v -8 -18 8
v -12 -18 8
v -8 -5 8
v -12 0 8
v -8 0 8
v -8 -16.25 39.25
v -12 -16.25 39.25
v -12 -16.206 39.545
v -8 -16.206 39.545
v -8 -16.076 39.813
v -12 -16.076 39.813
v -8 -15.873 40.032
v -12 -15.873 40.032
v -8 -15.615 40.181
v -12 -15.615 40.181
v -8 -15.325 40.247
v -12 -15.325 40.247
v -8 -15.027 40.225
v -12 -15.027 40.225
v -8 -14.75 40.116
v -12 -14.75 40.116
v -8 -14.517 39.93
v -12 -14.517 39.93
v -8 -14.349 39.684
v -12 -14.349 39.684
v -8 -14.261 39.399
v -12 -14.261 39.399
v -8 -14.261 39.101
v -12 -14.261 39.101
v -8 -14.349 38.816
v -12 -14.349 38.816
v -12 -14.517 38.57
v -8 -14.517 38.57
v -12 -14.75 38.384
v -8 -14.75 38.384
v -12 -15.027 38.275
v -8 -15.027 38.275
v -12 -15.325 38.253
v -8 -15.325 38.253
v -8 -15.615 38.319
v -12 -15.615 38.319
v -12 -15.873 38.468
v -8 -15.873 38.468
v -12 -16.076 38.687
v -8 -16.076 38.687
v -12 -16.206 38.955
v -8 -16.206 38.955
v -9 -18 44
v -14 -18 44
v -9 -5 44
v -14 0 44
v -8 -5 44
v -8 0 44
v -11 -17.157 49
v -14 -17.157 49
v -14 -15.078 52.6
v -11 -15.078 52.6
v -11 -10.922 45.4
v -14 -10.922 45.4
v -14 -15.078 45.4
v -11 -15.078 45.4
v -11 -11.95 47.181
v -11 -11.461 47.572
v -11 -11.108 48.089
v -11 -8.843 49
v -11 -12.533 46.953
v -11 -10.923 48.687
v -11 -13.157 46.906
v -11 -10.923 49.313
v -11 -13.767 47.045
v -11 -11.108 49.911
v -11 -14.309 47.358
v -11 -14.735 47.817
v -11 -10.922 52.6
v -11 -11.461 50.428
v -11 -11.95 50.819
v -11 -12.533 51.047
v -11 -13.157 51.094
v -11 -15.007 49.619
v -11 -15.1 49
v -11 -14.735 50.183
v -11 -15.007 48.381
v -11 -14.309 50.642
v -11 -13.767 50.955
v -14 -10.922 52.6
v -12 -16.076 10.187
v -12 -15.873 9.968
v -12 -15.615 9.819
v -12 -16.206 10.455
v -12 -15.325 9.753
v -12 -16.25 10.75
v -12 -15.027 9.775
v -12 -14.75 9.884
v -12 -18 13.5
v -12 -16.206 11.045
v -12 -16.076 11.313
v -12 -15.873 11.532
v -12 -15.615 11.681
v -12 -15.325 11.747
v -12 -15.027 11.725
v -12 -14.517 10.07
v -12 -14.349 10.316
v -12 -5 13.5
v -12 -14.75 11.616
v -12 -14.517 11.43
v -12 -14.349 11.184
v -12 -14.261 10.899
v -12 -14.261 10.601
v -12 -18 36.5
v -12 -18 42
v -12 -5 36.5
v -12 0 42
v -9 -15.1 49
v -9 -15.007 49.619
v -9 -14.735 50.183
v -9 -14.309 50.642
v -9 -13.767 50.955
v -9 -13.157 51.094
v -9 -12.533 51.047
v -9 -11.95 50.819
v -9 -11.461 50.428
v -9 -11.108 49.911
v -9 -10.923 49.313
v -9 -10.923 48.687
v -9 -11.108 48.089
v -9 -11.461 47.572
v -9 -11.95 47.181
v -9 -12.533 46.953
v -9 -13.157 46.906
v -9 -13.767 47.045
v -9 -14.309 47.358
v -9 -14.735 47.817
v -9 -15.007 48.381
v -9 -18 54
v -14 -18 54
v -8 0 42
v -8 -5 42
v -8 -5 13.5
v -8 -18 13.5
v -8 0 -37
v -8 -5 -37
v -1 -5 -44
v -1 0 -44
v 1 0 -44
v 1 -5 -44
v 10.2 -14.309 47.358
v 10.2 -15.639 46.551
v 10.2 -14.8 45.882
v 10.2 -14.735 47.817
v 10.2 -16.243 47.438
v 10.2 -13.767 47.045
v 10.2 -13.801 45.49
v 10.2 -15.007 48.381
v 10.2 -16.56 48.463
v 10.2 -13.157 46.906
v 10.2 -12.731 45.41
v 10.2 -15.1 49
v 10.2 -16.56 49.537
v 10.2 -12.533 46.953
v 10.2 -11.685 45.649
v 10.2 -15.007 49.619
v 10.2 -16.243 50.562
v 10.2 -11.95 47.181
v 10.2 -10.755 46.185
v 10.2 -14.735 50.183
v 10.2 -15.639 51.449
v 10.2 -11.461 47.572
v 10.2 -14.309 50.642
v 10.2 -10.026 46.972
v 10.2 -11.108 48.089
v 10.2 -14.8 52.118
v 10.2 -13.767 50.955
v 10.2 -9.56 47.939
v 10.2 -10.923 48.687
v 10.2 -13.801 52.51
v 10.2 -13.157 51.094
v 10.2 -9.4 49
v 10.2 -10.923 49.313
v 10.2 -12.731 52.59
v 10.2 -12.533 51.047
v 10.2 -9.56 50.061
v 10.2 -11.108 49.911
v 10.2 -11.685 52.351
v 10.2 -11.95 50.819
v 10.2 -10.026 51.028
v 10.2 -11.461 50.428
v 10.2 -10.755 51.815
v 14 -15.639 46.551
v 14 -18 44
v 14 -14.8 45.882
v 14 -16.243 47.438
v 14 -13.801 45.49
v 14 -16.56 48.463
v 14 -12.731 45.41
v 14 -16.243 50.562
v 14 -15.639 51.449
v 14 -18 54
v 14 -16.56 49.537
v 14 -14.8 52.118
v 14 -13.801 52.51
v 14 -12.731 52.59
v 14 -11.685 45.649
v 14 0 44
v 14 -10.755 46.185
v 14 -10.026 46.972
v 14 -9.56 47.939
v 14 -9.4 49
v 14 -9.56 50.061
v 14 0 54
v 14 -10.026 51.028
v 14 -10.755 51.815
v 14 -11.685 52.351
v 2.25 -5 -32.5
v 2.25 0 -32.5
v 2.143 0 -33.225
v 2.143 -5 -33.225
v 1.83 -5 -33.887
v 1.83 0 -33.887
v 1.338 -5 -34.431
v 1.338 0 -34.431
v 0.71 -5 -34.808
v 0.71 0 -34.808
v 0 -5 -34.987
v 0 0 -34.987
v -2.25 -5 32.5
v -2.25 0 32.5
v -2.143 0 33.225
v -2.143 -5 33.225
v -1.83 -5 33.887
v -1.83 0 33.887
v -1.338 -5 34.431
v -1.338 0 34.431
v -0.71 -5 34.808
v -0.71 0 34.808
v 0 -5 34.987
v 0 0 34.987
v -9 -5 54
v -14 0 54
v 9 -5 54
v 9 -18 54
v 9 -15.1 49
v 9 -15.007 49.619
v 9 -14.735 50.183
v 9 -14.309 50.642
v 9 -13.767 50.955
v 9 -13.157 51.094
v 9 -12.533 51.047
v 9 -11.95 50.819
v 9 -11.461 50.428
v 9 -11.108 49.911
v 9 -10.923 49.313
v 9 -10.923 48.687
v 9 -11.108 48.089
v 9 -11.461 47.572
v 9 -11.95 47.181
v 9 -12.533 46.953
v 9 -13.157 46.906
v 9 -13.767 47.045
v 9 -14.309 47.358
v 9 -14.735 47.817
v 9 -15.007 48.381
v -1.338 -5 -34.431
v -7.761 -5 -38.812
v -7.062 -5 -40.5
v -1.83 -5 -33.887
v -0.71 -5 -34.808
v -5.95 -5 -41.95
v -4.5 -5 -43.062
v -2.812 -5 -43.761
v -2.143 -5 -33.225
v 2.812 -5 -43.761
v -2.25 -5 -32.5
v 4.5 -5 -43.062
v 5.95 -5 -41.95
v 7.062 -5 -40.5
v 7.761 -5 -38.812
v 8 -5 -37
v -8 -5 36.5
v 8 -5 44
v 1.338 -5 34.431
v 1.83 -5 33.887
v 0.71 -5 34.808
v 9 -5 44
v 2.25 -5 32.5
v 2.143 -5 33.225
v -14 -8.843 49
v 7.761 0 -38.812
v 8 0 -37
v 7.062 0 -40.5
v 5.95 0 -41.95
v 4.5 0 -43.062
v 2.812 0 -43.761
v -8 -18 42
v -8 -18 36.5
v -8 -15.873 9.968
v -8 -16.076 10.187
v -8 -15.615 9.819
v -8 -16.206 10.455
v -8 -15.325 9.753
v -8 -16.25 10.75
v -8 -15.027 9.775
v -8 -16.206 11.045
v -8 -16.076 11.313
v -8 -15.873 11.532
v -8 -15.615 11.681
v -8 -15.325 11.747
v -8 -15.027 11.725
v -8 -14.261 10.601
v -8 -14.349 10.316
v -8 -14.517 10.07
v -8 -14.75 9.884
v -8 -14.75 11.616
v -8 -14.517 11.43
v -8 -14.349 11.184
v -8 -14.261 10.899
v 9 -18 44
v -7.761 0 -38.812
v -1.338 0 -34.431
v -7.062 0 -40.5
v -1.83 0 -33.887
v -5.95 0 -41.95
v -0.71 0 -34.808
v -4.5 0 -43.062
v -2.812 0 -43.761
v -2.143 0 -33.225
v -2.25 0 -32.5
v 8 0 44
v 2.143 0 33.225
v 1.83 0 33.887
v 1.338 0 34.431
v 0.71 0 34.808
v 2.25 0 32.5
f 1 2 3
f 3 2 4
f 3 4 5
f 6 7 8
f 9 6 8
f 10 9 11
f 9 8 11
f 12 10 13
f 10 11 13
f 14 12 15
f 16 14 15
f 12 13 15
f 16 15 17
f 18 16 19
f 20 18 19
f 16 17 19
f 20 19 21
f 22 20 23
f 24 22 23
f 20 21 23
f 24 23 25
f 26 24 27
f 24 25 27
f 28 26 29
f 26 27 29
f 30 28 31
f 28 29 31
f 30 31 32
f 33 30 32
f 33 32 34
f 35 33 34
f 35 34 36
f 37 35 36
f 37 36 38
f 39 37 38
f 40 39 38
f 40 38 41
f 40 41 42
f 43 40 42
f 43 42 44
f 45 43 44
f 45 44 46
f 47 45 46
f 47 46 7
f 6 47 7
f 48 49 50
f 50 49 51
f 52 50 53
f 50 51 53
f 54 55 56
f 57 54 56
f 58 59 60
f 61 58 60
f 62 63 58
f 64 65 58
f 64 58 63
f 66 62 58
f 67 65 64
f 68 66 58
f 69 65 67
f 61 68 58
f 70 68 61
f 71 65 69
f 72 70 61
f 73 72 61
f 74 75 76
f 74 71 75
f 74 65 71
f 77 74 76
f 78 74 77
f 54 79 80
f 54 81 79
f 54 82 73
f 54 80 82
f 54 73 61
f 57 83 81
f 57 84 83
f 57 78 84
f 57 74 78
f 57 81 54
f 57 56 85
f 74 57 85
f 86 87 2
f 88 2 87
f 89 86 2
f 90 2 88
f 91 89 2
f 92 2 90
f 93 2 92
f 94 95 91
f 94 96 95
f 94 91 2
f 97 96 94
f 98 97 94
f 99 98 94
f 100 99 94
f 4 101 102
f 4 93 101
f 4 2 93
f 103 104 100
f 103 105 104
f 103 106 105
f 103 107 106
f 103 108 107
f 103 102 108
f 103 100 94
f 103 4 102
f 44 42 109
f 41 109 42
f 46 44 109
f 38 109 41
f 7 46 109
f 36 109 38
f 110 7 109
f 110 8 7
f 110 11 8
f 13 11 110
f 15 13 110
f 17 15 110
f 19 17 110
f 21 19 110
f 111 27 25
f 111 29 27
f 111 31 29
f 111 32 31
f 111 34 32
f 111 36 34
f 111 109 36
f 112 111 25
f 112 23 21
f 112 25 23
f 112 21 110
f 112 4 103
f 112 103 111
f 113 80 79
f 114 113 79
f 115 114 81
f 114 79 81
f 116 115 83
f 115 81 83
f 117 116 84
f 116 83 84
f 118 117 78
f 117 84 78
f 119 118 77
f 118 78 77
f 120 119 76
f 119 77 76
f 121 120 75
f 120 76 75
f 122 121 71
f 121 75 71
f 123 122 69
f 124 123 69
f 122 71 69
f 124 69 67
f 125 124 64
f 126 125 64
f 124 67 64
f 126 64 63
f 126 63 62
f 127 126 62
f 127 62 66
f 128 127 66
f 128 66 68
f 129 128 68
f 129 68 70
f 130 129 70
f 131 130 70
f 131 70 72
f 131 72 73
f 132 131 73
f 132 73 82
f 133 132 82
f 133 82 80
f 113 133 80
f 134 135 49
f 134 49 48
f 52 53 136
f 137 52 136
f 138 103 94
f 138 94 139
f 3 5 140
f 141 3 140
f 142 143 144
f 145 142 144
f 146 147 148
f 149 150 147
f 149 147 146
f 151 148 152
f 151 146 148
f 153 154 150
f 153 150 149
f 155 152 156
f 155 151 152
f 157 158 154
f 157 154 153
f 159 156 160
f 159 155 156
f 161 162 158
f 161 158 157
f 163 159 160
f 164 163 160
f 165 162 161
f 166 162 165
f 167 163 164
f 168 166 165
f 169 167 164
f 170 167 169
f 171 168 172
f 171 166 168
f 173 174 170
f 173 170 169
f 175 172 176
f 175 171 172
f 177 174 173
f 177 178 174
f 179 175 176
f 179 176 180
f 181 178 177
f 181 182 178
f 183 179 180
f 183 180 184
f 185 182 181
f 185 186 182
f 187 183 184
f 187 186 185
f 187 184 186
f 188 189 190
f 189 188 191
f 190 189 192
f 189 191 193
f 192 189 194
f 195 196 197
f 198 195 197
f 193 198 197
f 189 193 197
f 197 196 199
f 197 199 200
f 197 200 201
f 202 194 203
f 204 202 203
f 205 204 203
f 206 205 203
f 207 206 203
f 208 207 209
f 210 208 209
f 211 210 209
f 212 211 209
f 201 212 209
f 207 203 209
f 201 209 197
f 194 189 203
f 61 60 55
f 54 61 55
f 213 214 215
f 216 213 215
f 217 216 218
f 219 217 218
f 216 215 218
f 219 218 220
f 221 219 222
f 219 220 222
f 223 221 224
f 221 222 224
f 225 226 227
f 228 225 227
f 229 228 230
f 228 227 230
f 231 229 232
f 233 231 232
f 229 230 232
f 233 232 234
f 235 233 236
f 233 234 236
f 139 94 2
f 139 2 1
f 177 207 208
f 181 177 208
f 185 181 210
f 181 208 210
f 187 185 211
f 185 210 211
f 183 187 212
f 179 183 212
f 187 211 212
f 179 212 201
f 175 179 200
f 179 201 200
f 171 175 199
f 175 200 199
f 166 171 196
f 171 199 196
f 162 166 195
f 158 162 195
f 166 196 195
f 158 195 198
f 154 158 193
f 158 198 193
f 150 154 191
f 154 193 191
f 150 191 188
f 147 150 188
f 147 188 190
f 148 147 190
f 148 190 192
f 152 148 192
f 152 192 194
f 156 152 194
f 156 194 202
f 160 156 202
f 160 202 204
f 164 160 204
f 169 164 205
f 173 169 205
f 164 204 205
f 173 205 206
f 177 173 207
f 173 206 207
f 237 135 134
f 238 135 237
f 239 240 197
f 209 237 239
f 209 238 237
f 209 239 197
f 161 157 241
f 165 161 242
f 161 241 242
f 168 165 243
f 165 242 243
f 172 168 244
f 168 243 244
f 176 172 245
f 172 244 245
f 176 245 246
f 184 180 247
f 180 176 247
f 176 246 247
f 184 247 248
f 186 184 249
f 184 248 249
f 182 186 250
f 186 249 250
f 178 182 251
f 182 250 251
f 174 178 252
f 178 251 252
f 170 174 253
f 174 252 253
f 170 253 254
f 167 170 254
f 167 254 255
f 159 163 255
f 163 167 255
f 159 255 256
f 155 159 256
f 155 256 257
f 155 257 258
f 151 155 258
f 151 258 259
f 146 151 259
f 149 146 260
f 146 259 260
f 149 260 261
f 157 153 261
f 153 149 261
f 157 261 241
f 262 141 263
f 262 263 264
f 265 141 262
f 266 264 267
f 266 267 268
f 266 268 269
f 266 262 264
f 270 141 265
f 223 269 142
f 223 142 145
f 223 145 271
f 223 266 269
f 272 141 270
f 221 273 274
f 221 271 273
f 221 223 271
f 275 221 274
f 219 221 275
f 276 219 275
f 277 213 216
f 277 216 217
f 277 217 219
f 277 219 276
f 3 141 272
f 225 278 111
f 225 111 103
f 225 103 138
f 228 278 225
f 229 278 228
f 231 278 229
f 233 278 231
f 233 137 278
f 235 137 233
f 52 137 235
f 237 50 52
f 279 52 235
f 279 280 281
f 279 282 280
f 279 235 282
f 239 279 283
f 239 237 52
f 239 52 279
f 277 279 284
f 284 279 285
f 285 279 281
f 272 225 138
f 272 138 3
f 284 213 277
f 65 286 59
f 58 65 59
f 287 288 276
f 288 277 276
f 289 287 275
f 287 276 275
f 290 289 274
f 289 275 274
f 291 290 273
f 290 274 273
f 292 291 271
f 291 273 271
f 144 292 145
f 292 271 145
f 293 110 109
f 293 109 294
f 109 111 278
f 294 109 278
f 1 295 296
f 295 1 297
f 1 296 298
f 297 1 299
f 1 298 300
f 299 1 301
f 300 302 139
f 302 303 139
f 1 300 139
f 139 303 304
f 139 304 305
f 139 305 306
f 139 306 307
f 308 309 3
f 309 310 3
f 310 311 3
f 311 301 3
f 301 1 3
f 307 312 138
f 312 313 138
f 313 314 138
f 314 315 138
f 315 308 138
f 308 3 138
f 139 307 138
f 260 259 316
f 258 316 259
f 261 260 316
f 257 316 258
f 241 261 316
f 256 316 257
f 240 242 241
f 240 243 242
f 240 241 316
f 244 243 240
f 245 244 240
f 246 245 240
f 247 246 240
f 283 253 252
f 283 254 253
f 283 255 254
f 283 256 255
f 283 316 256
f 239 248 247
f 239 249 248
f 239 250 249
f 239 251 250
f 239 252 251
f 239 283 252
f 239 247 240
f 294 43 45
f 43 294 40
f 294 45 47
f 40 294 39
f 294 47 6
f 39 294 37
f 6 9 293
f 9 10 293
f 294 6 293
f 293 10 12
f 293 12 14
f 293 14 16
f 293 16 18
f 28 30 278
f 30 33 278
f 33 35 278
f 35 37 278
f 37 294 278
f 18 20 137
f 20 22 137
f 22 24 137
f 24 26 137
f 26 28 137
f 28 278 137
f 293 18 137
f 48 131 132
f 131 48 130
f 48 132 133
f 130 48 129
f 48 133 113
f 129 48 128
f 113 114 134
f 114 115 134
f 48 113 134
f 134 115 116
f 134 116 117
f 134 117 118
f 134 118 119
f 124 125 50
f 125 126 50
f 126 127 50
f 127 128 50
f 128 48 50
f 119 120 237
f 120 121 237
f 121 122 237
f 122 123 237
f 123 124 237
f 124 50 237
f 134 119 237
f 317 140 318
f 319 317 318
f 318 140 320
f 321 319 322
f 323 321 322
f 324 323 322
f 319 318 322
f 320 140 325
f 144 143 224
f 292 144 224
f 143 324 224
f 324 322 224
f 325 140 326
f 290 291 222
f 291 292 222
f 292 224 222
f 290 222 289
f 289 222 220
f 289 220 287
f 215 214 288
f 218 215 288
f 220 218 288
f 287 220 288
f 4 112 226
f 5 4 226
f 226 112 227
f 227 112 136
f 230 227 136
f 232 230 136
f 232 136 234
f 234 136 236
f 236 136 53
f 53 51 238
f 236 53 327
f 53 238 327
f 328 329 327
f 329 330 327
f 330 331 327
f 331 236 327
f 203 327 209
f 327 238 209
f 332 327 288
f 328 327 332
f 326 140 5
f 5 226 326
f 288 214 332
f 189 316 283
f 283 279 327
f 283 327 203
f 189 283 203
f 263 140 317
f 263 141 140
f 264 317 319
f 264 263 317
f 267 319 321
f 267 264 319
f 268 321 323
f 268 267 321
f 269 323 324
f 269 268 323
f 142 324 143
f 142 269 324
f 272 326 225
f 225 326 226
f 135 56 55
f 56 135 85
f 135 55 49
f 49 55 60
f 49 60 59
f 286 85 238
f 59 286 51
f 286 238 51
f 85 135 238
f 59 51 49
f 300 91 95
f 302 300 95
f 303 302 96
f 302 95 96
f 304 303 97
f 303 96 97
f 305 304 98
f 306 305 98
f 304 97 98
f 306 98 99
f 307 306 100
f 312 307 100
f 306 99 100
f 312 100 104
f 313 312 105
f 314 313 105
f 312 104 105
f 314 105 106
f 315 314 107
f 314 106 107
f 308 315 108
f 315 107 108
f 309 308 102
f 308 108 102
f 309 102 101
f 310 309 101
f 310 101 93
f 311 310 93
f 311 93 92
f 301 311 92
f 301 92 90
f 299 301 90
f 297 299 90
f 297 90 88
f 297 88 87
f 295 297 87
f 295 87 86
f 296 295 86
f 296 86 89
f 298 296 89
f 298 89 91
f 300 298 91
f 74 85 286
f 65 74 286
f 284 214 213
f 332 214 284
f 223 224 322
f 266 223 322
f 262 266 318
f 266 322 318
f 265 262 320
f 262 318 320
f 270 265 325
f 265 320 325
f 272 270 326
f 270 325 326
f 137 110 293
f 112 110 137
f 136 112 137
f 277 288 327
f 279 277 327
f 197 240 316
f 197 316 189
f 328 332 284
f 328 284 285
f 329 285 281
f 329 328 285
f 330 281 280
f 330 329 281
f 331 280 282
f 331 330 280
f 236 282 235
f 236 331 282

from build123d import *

# Parameters (mm, degrees)
F0_W         = 4.5
F0_H         = 70
F0_W_2       = 4
F0_H_2       = 34
F1_DEPTH     = 5
F2_W         = 5
F2_H         = 10
F2_W_2       = 4
F2_H_2       = 5.5
F3_DEPTH     = 13
F4_R         = 2.1
F4_R_2       = 1
F5_DEPTH     = 28.001
F6_R         = 2.1
F7_DEPTH     = 3
F8_R         = 3.6
F8_R_2       = 2.1
F9_DEPTH     = 3.8
F10_R        = 7
F11_T1_DEPTH = 5


# Not quite as in the source:
# - a fillet or chamfer that OpenCascade refuses, or shapes differently, is made with other operations: its cross-section is extruded or revolved along the edge and cut away or added


with BuildPart() as f1:
    # F0 (on Front) → F1 (new body)
    with BuildSketch(Plane.XZ):
        Polygon((-8, -44), (8, -44), (8, 44), (-8, 44), (-8, 42), (-8, 8), align=None)
        Rectangle(F0_W, F0_H, mode=Mode.SUBTRACT)
        Polygon((-8, 44), (8, 44), (14, 44), (14, 54), (-14, 54), (-14, 44), align=None)
        with Locations((-10, 25)):
            Rectangle(F0_W_2, F0_H_2)
    extrude(amount=F1_DEPTH)

    # F2 (on face) → F3 (join)
    with BuildSketch(Plane.XZ.offset(5)):
        with Locations((11.5, 49)):
            Rectangle(F2_W, F2_H)
        with Locations((-11.5, 49)):
            Rectangle(F2_W, F2_H)
        with Locations((-10, 10.75)):
            Rectangle(F2_W_2, F2_H_2)
        with Locations((-10, 39.25)):
            Rectangle(F2_W_2, F2_H_2)
    extrude(amount=F3_DEPTH)

    # F4 (on face) → F5 (cut, through all)
    with BuildSketch(Plane(origin=(-14, 0, 0), x_dir=(0, -1, 0), z_dir=(-1, 0, 0))):
        with Locations((13, 49)):
            Circle(F4_R)
        with Locations((15.25, 39.25)):
            Circle(F4_R_2)
        with Locations((15.25, 10.75)):
            Circle(F4_R_2)
    extrude(amount=-F5_DEPTH, mode=Mode.SUBTRACT)

    # F6 (on face) → F7 (cut)
    with BuildSketch(Plane(origin=(-14, 0, 0), x_dir=(0, -1, 0), z_dir=(-1, 0, 0))):
        Polygon((15.0784609691, 45.4), (17.1569219382, 49), (15.0784609691, 52.6), (10.9215390309, 52.6), (8.8430780618, 49), (10.9215390309, 45.4), align=None)
        with Locations((13, 49)):
            Circle(F6_R, mode=Mode.SUBTRACT)
    extrude(amount=-F7_DEPTH, mode=Mode.SUBTRACT)

    # F8 (on face) → F9 (cut)
    with BuildSketch(Plane.YZ.offset(14)):
        with Locations((-13, 49)):
            Circle(F8_R)
        with Locations((-13, 49)):
            Circle(F8_R_2, mode=Mode.SUBTRACT)
    extrude(amount=-F9_DEPTH, mode=Mode.SUBTRACT)

    # F10
    f10_edges = [f1.edges().sort_by_distance(p)[0] for p in [
        (8, -2.5, -44),
        (-8, -2.5, -44),
    ]]
    fillet(f10_edges, radius=F10_R)

    # F11: fillet of radius 2.5 on 4 edges, made by hand

    # F11_s2 → F11_t1 (join)
    with BuildSketch(Plane.XZ):
        with BuildLine():
            ThreePointArc((0.25, -35), (-1.517766953, -34.267766953), (-2.25, -32.5))
            Line((-2.25, -32.5), (-2.25, -35))
            Line((-2.25, -35), (0.25, -35))
        make_face()
        with BuildLine():
            ThreePointArc((2.25, -32.5), (1.517766953, -34.267766953), (-0.25, -35))
            Line((-0.25, -35), (2.25, -35))
            Line((2.25, -35), (2.25, -32.5))
        make_face()
        with BuildLine():
            ThreePointArc((-2.25, 32.5), (-1.517766953, 34.267766953), (0.25, 35))
            Line((0.25, 35), (-2.25, 35))
            Line((-2.25, 35), (-2.25, 32.5))
        make_face()
        with BuildLine():
            ThreePointArc((2.25, 32.5), (1.517766953, 34.267766953), (-0.25, 35))
            Line((-0.25, 35), (2.25, 35))
            Line((2.25, 35), (2.25, 32.5))
        make_face()
    extrude(amount=F11_T1_DEPTH)


solid = f1.part
